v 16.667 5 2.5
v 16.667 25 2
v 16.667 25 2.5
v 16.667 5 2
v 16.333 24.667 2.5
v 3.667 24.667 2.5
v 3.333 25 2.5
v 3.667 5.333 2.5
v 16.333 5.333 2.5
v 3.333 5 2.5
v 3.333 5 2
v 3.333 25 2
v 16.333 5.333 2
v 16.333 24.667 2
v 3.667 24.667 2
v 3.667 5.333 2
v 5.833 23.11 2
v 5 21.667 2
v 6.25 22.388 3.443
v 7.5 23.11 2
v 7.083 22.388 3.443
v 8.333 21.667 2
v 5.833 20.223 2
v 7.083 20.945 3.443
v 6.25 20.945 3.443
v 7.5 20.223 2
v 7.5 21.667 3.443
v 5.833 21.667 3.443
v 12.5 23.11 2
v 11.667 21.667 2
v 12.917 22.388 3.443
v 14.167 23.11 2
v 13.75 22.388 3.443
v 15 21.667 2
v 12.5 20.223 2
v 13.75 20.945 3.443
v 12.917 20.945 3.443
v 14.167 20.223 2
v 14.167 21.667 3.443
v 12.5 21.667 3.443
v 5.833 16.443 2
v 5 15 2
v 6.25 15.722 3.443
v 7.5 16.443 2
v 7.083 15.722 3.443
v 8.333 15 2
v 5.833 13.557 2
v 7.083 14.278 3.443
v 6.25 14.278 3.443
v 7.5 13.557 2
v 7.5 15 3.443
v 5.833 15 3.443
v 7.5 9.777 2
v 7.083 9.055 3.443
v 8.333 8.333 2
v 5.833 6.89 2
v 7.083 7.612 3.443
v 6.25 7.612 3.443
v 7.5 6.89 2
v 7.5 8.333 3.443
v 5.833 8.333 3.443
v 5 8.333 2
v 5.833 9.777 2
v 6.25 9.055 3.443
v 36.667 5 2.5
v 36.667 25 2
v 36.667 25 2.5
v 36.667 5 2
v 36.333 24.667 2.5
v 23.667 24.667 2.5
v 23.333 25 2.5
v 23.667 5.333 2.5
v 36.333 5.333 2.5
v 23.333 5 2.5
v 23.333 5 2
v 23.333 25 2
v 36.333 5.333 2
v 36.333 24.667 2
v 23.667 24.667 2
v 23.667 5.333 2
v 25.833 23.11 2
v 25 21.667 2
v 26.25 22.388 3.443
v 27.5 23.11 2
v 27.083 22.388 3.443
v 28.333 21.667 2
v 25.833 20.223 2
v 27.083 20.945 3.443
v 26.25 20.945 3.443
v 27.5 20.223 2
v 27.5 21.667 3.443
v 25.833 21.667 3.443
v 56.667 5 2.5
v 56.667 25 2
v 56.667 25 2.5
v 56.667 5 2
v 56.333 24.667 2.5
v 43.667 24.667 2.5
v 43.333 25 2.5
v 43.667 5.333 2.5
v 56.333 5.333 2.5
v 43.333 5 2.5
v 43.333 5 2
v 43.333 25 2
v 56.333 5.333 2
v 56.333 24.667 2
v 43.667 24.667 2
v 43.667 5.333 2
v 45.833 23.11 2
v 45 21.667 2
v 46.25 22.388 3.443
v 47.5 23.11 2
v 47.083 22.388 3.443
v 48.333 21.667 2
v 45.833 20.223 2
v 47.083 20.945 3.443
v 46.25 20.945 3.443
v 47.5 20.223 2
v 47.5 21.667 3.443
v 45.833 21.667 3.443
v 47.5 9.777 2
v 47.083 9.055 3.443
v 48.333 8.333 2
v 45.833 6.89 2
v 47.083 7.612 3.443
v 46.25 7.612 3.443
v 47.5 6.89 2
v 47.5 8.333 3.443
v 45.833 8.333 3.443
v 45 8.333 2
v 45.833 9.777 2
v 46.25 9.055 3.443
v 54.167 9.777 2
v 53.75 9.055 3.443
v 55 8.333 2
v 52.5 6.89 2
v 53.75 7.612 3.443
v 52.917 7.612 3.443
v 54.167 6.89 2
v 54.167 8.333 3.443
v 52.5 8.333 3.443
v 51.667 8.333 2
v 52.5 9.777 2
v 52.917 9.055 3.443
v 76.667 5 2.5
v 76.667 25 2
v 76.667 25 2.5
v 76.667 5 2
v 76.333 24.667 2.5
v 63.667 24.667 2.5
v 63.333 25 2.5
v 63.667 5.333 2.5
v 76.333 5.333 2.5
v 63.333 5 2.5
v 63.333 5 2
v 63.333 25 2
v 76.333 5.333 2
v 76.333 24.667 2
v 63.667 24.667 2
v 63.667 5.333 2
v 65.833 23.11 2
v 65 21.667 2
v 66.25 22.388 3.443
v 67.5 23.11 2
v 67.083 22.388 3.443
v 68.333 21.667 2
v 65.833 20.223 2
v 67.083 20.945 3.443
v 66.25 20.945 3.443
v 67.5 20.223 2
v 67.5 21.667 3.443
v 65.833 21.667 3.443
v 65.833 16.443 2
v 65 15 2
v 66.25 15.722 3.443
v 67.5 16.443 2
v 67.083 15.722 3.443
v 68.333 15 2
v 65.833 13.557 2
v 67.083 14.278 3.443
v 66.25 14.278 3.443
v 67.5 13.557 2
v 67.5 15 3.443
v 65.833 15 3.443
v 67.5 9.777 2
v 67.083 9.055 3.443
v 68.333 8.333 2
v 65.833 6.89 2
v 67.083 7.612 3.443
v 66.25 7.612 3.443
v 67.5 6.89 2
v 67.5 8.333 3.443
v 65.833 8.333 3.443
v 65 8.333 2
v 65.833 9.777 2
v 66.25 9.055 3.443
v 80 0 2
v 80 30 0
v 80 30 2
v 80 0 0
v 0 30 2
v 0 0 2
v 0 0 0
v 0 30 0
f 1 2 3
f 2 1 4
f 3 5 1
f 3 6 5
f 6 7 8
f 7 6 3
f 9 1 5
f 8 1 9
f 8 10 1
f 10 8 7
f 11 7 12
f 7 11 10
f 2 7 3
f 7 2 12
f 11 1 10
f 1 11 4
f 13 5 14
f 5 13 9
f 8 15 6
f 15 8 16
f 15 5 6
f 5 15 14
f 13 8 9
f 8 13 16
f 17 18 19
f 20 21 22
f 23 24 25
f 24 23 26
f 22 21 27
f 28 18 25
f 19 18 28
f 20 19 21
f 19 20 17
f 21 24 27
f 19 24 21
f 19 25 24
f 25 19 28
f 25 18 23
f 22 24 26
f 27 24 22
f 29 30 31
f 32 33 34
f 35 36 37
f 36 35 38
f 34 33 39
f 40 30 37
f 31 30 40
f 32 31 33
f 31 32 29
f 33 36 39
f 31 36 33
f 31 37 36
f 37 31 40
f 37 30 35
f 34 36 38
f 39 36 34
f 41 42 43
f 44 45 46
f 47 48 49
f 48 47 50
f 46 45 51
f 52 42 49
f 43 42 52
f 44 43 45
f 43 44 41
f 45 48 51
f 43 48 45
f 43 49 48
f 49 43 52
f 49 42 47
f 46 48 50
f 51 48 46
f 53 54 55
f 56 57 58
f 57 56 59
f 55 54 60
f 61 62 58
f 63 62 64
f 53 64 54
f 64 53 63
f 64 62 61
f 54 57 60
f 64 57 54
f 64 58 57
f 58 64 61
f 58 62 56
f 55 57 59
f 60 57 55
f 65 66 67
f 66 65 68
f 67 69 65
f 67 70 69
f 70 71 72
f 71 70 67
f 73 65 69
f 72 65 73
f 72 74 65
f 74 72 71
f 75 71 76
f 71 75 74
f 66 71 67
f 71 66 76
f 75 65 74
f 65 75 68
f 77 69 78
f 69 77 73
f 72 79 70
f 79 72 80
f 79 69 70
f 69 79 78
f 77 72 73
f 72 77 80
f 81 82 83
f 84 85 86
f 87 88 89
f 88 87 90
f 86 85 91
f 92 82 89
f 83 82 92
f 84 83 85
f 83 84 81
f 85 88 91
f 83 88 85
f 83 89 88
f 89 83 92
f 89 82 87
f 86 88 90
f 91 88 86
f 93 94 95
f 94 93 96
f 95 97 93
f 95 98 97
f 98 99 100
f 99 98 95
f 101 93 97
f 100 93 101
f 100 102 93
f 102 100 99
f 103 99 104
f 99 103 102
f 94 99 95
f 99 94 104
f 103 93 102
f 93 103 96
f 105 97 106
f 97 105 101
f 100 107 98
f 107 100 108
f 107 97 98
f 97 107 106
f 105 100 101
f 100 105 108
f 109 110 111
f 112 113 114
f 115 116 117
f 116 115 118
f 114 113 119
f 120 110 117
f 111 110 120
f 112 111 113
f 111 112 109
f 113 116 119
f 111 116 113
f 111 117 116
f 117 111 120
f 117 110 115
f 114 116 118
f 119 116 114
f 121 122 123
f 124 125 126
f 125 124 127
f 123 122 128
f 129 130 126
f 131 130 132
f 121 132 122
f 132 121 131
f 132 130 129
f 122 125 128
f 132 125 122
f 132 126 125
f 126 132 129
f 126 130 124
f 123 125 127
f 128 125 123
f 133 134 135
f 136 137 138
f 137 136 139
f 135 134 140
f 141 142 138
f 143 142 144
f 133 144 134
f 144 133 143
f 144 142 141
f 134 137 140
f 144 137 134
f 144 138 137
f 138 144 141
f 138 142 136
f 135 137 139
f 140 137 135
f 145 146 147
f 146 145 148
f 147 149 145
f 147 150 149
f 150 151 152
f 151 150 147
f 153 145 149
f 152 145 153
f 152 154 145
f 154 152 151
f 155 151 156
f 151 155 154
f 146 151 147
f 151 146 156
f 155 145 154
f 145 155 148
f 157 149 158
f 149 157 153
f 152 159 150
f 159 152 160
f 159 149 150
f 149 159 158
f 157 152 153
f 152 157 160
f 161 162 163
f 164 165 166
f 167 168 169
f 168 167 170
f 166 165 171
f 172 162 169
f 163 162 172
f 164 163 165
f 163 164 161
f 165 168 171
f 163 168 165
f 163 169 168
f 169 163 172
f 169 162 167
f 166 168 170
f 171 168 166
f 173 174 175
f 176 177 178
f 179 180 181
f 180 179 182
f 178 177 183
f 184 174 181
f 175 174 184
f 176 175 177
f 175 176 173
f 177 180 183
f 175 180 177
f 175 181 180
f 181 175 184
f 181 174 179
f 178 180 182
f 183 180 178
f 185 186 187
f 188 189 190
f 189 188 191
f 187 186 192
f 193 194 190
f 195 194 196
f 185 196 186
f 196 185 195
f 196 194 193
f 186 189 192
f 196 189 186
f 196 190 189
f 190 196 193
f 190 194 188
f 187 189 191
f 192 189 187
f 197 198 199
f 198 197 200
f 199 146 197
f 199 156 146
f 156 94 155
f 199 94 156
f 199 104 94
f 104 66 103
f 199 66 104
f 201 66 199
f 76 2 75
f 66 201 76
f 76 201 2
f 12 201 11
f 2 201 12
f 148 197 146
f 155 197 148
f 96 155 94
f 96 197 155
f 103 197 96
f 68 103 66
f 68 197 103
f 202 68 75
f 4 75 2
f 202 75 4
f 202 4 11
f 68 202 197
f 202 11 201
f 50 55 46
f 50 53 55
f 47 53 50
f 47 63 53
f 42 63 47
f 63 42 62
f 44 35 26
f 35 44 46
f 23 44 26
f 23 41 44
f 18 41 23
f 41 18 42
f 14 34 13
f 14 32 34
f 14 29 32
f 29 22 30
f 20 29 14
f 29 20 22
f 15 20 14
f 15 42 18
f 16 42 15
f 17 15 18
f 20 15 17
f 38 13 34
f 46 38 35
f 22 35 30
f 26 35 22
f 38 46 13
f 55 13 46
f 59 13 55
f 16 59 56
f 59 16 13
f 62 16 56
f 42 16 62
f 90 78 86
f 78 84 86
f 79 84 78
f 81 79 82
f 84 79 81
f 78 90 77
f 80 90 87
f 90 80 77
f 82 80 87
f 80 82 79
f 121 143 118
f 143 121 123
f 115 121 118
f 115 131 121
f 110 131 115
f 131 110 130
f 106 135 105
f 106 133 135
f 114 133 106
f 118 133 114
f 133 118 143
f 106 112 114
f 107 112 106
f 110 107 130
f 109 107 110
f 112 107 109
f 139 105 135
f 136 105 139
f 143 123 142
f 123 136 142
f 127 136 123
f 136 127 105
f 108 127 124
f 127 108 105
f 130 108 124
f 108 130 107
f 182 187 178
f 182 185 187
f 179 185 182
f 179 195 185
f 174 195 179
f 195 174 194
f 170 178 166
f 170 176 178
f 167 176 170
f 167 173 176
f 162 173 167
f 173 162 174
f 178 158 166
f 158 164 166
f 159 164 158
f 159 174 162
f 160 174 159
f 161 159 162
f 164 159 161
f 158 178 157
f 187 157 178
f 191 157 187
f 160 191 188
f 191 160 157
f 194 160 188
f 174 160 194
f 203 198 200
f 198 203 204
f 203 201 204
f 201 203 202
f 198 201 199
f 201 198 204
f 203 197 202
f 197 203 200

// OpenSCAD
//Enter Text
Text="Paul";
//Text height in mm
Size=20; //[10,20,30,40,50]
Show_Build="No"; //[Yes,No]
//Size of build platform (inches)
Build_Size=12; //[8,10,12,14]
//Is this a Key Ring?
Key_Ring="No"; //[Yes,No]

module Insert(Letter,TextSize){

	x=[-TextSize,TextSize,-TextSize,TextSize,-TextSize,TextSize];
	y=[2*TextSize,2*TextSize,0,0,-2*TextSize,-2*TextSize];
	difference(){
		cube([4*TextSize,6*TextSize,1],center=true);
		cube([3.8*TextSize,5.8*TextSize,2],center=true);
	}
	//echo (Letter);
	for (i=[0:5]){
		if ((Letter[i])==1) translate([x[i],y[i],0]) sphere(r=0.5*TextSize);
	}
}
module WORD(Word,TxtSize){

	a=[1,0,0,0,0,0];
	b=[1,0,1,0,0,0];
	c=[1,1,0,0,0,0];
	d=[1,1,0,1,0,0];
	e=[1,0,0,1,0,0];
	f=[1,1,1,0,0,0];
	g=[1,1,1,1,0,0];
	h=[1,0,1,1,0,0];
	i=[0,1,1,0,0,0];
	j=[0,1,1,1,0,0];
	k=[1,0,0,0,1,0];
	l=[1,0,1,0,1,0];
	m=[1,1,0,0,1,0];
	n=[1,1,0,1,1,0];
	o=[1,0,0,1,1,0]; 
	p=[1,1,1,0,1,0];
	q=[1,1,1,1,1,0];
	r=[1,0,1,1,1,0];
	s=[0,1,1,0,1,0];
	t=[0,1,1,1,1,0];
	u=[1,0,0,0,1,1];
	v=[1,0,1,0,1,1];
	w=[0,1,1,1,0,1];
	x=[1,1,0,0,1,1];
	y=[1,1,0,1,1,1];
	z=[1,0,0,1,1,1];
	
	translate([TxtSize*3,0,0])
	for (i=[0:len(Word)-1]){
		translate([TxtSize*i*6,0,0]) {
			if (Word[i]=="A" || Word[i]=="a") Insert(a,TxtSize);
			if (Word[i]=="B" || Word[i]=="b") Insert(b,TxtSize);
			if (Word[i]=="C" || Word[i]=="c") Insert(c,TxtSize);
			if (Word[i]=="D" || Word[i]=="d") Insert(d,TxtSize);
			if (Word[i]=="E" || Word[i]=="e") Insert(e,TxtSize);
			if (Word[i]=="F" || Word[i]=="f") Insert(f,TxtSize);
			if (Word[i]=="G" || Word[i]=="g") Insert(g,TxtSize);
			if (Word[i]=="H" || Word[i]=="h") Insert(h,TxtSize);
			if (Word[i]=="I" || Word[i]=="i") Insert(i,TxtSize);
			if (Word[i]=="J" || Word[i]=="j") Insert(j,TxtSize);
			if (Word[i]=="K" || Word[i]=="k") Insert(k,TxtSize);
			if (Word[i]=="L" || Word[i]=="l") Insert(l,TxtSize);
			if (Word[i]=="M" || Word[i]=="m") Insert(m,TxtSize);
			if (Word[i]=="N" || Word[i]=="n") Insert(n,TxtSize);
			if (Word[i]=="O" || Word[i]=="o") Insert(o,TxtSize);
			if (Word[i]=="P" || Word[i]=="p") Insert(p,TxtSize);
			if (Word[i]=="Q" || Word[i]=="q") Insert(q,TxtSize);
			if (Word[i]=="R" || Word[i]=="r") Insert(r,TxtSize);
			if (Word[i]=="S" || Word[i]=="s") Insert(s,TxtSize);
			if (Word[i]=="T" || Word[i]=="t") Insert(t,TxtSize);
			if (Word[i]=="U" || Word[i]=="u") Insert(u,TxtSize);
			if (Word[i]=="V" || Word[i]=="v") Insert(v,TxtSize);
			if (Word[i]=="W" || Word[i]=="w") Insert(w,TxtSize);
			if (Word[i]=="X" || Word[i]=="x") Insert(x,TxtSize);
			if (Word[i]=="Y" || Word[i]=="y") Insert(y,TxtSize);
			if (Word[i]=="Z" || Word[i]=="z") Insert(z,TxtSize);
		}
	}
}
if (Show_Build=="Yes") { color("blue") translate([-10,-10,-.9]) cube([Build_Size*25.4,Build_Size*25.4,1]);}
if (Key_Ring=="No"){
	translate([0,0,0]) cube([Size*(len(Text)),Size*1.5,Size/10]);
	translate([0,Size*.75,Size/10]) WORD(Text,Size/6);
} else {
	difference(){
		cube([Size*(len(Text))+10,Size*1.5,Size/10]);
		translate([5,Size*.75,-2]) cylinder(r=3,h=Size);
	}
	translate([10,Size*.75,Size/10]) WORD(Text,Size/6);
}
